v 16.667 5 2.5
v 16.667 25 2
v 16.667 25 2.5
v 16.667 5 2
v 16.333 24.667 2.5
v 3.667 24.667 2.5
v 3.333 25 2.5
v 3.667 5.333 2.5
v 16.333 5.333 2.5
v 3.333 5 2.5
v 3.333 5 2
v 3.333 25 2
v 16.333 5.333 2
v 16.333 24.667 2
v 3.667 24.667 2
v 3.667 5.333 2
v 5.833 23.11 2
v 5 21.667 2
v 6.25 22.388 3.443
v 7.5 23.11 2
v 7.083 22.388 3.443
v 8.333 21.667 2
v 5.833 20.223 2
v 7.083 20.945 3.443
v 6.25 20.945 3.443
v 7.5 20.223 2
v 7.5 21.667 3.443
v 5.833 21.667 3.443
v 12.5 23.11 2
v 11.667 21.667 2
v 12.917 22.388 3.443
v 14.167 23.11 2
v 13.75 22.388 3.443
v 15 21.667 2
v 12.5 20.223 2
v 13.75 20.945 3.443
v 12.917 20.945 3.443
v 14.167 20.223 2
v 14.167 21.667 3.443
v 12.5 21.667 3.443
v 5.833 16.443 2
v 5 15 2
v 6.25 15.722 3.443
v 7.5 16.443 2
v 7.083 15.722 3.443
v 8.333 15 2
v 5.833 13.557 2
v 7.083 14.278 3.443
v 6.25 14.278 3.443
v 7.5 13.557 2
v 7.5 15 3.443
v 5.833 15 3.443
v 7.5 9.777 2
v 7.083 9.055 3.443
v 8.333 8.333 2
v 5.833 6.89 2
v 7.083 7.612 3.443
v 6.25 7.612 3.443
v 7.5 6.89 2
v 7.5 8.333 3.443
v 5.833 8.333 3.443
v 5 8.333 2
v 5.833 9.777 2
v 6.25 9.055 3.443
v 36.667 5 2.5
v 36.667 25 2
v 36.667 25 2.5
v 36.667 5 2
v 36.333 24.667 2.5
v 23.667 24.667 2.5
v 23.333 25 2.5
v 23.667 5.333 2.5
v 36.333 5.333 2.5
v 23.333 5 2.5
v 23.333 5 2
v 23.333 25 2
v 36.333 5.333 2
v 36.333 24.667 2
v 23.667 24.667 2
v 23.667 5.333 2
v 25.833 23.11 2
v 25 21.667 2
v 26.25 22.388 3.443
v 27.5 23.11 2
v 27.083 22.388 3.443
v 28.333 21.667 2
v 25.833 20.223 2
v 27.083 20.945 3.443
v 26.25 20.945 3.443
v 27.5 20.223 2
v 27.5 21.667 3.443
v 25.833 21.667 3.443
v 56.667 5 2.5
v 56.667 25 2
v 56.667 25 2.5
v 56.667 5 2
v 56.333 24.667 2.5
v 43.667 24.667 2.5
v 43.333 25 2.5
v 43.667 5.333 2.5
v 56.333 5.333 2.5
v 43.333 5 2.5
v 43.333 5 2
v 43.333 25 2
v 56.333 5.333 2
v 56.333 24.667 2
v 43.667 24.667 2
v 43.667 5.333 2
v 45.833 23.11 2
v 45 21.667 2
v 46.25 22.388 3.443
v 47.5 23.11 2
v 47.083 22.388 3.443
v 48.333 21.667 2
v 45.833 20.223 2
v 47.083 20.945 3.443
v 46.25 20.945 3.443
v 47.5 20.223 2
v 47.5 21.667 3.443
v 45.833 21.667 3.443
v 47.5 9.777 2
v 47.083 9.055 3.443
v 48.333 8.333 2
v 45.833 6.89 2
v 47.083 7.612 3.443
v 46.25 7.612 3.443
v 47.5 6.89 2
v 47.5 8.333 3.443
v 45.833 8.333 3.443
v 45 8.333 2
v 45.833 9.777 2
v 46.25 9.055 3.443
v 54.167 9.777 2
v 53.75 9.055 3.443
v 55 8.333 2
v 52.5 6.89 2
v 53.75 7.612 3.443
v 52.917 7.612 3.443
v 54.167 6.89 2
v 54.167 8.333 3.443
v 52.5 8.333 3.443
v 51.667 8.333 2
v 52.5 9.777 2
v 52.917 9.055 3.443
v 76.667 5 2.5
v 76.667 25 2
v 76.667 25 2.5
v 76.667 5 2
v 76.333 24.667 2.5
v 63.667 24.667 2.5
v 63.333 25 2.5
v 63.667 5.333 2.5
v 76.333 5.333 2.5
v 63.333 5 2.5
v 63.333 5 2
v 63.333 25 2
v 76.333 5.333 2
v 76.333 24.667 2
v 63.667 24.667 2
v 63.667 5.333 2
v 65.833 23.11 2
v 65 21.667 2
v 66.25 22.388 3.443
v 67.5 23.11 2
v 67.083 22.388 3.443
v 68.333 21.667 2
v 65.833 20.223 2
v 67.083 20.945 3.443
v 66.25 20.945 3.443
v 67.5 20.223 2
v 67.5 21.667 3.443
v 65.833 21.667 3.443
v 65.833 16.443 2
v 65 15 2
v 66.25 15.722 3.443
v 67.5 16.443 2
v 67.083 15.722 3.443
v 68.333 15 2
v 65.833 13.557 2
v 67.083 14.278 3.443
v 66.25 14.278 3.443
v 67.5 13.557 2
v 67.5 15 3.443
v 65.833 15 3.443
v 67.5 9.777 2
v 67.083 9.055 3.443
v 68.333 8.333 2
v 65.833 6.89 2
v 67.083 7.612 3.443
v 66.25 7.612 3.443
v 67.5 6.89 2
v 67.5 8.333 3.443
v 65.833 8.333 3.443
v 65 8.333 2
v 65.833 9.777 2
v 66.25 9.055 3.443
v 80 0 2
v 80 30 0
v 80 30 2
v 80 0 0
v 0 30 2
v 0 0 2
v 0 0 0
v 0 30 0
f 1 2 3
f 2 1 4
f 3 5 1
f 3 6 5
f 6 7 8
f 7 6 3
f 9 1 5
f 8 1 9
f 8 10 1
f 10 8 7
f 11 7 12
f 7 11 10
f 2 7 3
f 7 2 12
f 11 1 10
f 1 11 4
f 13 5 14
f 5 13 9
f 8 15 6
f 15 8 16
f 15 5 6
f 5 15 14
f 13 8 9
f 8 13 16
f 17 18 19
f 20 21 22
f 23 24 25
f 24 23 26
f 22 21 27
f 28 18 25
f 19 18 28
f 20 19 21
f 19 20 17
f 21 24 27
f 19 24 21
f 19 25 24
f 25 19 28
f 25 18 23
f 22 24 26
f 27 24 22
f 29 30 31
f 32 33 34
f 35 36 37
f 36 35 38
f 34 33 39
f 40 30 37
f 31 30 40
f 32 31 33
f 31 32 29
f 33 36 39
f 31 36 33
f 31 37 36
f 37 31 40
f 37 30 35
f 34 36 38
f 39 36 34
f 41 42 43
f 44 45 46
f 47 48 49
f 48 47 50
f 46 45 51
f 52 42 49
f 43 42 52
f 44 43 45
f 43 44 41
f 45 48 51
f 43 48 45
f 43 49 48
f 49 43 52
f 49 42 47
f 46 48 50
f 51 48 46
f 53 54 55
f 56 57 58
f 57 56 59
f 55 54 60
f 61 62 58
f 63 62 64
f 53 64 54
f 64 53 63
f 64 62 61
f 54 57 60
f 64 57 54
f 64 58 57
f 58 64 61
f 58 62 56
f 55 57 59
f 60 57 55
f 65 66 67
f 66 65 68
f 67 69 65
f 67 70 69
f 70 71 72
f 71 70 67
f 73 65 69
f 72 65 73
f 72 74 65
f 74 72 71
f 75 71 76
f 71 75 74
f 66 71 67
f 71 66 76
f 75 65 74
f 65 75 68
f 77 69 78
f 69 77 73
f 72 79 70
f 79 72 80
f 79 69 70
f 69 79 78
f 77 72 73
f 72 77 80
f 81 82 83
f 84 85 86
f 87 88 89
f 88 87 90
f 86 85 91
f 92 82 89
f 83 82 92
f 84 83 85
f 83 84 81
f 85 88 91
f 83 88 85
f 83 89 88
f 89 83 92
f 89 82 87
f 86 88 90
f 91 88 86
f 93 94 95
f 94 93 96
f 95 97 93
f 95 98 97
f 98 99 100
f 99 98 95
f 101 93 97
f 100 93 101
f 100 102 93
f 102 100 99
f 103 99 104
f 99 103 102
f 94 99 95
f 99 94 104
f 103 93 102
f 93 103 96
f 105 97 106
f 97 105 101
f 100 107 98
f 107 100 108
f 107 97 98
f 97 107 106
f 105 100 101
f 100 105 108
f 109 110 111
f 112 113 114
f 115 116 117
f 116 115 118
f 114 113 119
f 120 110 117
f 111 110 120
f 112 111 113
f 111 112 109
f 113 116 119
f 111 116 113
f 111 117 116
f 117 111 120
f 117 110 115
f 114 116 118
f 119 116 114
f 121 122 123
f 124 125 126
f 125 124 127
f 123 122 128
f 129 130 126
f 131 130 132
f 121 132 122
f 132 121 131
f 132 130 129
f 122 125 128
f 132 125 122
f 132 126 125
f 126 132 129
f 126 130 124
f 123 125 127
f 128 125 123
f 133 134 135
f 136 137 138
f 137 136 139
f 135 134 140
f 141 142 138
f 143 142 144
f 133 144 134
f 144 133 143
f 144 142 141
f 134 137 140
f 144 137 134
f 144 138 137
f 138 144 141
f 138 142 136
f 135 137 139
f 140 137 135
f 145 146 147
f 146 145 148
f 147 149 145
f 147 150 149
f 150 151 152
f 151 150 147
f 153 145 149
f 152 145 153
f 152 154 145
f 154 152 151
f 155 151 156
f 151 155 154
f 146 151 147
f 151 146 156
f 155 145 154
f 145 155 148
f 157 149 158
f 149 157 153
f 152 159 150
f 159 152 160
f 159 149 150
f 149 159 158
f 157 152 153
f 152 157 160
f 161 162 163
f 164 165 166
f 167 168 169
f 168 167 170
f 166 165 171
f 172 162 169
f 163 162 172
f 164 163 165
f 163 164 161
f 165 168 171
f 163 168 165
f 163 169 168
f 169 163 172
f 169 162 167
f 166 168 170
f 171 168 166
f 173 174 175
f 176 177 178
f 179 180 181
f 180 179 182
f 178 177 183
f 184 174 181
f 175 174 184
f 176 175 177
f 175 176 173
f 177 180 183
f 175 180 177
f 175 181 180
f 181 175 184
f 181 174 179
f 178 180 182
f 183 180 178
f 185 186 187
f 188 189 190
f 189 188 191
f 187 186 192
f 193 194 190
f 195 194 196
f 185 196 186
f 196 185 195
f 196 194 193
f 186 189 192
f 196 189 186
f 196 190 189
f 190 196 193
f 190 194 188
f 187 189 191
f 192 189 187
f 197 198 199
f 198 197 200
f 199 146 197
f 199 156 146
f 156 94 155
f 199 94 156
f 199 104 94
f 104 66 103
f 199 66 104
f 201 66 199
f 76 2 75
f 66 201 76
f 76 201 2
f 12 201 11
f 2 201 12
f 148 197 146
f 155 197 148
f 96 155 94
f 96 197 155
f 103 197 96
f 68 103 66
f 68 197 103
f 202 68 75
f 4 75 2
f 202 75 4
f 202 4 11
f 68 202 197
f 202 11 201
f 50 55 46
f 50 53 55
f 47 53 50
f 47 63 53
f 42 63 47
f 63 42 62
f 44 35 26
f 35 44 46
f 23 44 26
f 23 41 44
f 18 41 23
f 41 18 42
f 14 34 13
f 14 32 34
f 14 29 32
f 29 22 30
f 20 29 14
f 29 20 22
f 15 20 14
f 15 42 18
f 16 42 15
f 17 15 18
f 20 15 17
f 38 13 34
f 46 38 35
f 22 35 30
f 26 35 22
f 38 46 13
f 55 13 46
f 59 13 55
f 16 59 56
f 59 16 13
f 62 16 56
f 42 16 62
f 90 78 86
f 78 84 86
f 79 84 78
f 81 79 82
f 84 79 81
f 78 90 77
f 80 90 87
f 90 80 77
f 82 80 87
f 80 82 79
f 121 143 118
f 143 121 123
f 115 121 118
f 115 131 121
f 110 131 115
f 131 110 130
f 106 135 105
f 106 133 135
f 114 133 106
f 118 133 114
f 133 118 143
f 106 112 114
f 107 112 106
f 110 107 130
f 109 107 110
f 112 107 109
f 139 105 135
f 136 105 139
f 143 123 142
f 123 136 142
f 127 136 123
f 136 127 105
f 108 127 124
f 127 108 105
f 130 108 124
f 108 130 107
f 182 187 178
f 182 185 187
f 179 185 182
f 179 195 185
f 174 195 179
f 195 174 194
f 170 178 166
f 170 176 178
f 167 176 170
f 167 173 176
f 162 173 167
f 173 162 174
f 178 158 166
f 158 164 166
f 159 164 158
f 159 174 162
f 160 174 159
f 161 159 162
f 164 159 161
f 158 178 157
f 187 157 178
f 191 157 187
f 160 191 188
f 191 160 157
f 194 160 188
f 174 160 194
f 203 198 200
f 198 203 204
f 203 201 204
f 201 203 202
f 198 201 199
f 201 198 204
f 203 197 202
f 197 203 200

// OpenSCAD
//Enter Text
Text="Paul";
//Text height in mm
Size=20; //[10,20,30,40,50]
Show_Build="No"; //[Yes,No]
//Size of build platform (inches)
Build_Size=12; //[8,10,12,14]
//Is this a Key Ring?
Key_Ring="No"; //[Yes,No]

module Insert(Letter,TextSize){

	x=[-TextSize,TextSize,-TextSize,TextSize,-TextSize,TextSize];
	y=[2*TextSize,2*TextSize,0,0,-2*TextSize,-2*TextSize];
	difference(){
		cube([4*TextSize,6*TextSize,1],center=true);
		cube([3.8*TextSize,5.8*TextSize,2],center=true);
	}
	//echo (Letter);
	for (i=[0:5]){
		if ((Letter[i])==1) translate([x[i],y[i],0]) sphere(r=0.5*TextSize);
	}
}
module WORD(Word,TxtSize){

	a=[1,0,0,0,0,0];
	b=[1,0,1,0,0,0];
	c=[1,1,0,0,0,0];
	d=[1,1,0,1,0,0];
	e=[1,0,0,1,0,0];
	f=[1,1,1,0,0,0];
	g=[1,1,1,1,0,0];
	h=[1,0,1,1,0,0];
	i=[0,1,1,0,0,0];
	j=[0,1,1,1,0,0];
	k=[1,0,0,0,1,0];
	l=[1,0,1,0,1,0];
	m=[1,1,0,0,1,0];
	n=[1,1,0,1,1,0];
	o=[1,0,0,1,1,0]; 
	p=[1,1,1,0,1,0];
	q=[1,1,1,1,1,0];
	r=[1,0,1,1,1,0];
	s=[0,1,1,0,1,0];
	t=[0,1,1,1,1,0];
	u=[1,0,0,0,1,1];
	v=[1,0,1,0,1,1];
	w=[0,1,1,1,0,1];
	x=[1,1,0,0,1,1];
	y=[1,1,0,1,1,1];
	z=[1,0,0,1,1,1];
	
	translate([TxtSize*3,0,0])
	for (i=[0:len(Word)-1]){
		translate([TxtSize*i*6,0,0]) {
			if (Word[i]=="A" || Word[i]=="a") Insert(a,TxtSize);
			if (Word[i]=="B" || Word[i]=="b") Insert(b,TxtSize);
			if (Word[i]=="C" || Word[i]=="c") Insert(c,TxtSize);
			if (Word[i]=="D" || Word[i]=="d") Insert(d,TxtSize);
			if (Word[i]=="E" || Word[i]=="e") Insert(e,TxtSize);
			if (Word[i]=="F" || Word[i]=="f") Insert(f,TxtSize);
			if (Word[i]=="G" || Word[i]=="g") Insert(g,TxtSize);
			if (Word[i]=="H" || Word[i]=="h") Insert(h,TxtSize);
			if (Word[i]=="I" || Word[i]=="i") Insert(i,TxtSize);
			if (Word[i]=="J" || Word[i]=="j") Insert(j,TxtSize);
			if (Word[i]=="K" || Word[i]=="k") Insert(k,TxtSize);
			if (Word[i]=="L" || Word[i]=="l") Insert(l,TxtSize);
			if (Word[i]=="M" || Word[i]=="m") Insert(m,TxtSize);
			if (Word[i]=="N" || Word[i]=="n") Insert(n,TxtSize);
			if (Word[i]=="O" || Word[i]=="o") Insert(o,TxtSize);
			if (Word[i]=="P" || Word[i]=="p") Insert(p,TxtSize);
			if (Word[i]=="Q" || Word[i]=="q") Insert(q,TxtSize);
			if (Word[i]=="R" || Word[i]=="r") Insert(r,TxtSize);
			if (Word[i]=="S" || Word[i]=="s") Insert(s,TxtSize);
			if (Word[i]=="T" || Word[i]=="t") Insert(t,TxtSize);
			if (Word[i]=="U" || Word[i]=="u") Insert(u,TxtSize);
			if (Word[i]=="V" || Word[i]=="v") Insert(v,TxtSize);
			if (Word[i]=="W" || Word[i]=="w") Insert(w,TxtSize);
			if (Word[i]=="X" || Word[i]=="x") Insert(x,TxtSize);
			if (Word[i]=="Y" || Word[i]=="y") Insert(y,TxtSize);
			if (Word[i]=="Z" || Word[i]=="z") Insert(z,TxtSize);
		}
	}
}
if (Show_Build=="Yes") { color("blue") translate([-10,-10,-.9]) cube([Build_Size*25.4,Build_Size*25.4,1]);}
if (Key_Ring=="No"){
	translate([0,0,0]) cube([Size*(len(Text)),Size*1.5,Size/10]);
	translate([0,Size*.75,Size/10]) WORD(Text,Size/6);
} else {
	difference(){
		cube([Size*(len(Text))+10,Size*1.5,Size/10]);
		translate([5,Size*.75,-2]) cylinder(r=3,h=Size);
	}
	translate([10,Size*.75,Size/10]) WORD(Text,Size/6);
}
